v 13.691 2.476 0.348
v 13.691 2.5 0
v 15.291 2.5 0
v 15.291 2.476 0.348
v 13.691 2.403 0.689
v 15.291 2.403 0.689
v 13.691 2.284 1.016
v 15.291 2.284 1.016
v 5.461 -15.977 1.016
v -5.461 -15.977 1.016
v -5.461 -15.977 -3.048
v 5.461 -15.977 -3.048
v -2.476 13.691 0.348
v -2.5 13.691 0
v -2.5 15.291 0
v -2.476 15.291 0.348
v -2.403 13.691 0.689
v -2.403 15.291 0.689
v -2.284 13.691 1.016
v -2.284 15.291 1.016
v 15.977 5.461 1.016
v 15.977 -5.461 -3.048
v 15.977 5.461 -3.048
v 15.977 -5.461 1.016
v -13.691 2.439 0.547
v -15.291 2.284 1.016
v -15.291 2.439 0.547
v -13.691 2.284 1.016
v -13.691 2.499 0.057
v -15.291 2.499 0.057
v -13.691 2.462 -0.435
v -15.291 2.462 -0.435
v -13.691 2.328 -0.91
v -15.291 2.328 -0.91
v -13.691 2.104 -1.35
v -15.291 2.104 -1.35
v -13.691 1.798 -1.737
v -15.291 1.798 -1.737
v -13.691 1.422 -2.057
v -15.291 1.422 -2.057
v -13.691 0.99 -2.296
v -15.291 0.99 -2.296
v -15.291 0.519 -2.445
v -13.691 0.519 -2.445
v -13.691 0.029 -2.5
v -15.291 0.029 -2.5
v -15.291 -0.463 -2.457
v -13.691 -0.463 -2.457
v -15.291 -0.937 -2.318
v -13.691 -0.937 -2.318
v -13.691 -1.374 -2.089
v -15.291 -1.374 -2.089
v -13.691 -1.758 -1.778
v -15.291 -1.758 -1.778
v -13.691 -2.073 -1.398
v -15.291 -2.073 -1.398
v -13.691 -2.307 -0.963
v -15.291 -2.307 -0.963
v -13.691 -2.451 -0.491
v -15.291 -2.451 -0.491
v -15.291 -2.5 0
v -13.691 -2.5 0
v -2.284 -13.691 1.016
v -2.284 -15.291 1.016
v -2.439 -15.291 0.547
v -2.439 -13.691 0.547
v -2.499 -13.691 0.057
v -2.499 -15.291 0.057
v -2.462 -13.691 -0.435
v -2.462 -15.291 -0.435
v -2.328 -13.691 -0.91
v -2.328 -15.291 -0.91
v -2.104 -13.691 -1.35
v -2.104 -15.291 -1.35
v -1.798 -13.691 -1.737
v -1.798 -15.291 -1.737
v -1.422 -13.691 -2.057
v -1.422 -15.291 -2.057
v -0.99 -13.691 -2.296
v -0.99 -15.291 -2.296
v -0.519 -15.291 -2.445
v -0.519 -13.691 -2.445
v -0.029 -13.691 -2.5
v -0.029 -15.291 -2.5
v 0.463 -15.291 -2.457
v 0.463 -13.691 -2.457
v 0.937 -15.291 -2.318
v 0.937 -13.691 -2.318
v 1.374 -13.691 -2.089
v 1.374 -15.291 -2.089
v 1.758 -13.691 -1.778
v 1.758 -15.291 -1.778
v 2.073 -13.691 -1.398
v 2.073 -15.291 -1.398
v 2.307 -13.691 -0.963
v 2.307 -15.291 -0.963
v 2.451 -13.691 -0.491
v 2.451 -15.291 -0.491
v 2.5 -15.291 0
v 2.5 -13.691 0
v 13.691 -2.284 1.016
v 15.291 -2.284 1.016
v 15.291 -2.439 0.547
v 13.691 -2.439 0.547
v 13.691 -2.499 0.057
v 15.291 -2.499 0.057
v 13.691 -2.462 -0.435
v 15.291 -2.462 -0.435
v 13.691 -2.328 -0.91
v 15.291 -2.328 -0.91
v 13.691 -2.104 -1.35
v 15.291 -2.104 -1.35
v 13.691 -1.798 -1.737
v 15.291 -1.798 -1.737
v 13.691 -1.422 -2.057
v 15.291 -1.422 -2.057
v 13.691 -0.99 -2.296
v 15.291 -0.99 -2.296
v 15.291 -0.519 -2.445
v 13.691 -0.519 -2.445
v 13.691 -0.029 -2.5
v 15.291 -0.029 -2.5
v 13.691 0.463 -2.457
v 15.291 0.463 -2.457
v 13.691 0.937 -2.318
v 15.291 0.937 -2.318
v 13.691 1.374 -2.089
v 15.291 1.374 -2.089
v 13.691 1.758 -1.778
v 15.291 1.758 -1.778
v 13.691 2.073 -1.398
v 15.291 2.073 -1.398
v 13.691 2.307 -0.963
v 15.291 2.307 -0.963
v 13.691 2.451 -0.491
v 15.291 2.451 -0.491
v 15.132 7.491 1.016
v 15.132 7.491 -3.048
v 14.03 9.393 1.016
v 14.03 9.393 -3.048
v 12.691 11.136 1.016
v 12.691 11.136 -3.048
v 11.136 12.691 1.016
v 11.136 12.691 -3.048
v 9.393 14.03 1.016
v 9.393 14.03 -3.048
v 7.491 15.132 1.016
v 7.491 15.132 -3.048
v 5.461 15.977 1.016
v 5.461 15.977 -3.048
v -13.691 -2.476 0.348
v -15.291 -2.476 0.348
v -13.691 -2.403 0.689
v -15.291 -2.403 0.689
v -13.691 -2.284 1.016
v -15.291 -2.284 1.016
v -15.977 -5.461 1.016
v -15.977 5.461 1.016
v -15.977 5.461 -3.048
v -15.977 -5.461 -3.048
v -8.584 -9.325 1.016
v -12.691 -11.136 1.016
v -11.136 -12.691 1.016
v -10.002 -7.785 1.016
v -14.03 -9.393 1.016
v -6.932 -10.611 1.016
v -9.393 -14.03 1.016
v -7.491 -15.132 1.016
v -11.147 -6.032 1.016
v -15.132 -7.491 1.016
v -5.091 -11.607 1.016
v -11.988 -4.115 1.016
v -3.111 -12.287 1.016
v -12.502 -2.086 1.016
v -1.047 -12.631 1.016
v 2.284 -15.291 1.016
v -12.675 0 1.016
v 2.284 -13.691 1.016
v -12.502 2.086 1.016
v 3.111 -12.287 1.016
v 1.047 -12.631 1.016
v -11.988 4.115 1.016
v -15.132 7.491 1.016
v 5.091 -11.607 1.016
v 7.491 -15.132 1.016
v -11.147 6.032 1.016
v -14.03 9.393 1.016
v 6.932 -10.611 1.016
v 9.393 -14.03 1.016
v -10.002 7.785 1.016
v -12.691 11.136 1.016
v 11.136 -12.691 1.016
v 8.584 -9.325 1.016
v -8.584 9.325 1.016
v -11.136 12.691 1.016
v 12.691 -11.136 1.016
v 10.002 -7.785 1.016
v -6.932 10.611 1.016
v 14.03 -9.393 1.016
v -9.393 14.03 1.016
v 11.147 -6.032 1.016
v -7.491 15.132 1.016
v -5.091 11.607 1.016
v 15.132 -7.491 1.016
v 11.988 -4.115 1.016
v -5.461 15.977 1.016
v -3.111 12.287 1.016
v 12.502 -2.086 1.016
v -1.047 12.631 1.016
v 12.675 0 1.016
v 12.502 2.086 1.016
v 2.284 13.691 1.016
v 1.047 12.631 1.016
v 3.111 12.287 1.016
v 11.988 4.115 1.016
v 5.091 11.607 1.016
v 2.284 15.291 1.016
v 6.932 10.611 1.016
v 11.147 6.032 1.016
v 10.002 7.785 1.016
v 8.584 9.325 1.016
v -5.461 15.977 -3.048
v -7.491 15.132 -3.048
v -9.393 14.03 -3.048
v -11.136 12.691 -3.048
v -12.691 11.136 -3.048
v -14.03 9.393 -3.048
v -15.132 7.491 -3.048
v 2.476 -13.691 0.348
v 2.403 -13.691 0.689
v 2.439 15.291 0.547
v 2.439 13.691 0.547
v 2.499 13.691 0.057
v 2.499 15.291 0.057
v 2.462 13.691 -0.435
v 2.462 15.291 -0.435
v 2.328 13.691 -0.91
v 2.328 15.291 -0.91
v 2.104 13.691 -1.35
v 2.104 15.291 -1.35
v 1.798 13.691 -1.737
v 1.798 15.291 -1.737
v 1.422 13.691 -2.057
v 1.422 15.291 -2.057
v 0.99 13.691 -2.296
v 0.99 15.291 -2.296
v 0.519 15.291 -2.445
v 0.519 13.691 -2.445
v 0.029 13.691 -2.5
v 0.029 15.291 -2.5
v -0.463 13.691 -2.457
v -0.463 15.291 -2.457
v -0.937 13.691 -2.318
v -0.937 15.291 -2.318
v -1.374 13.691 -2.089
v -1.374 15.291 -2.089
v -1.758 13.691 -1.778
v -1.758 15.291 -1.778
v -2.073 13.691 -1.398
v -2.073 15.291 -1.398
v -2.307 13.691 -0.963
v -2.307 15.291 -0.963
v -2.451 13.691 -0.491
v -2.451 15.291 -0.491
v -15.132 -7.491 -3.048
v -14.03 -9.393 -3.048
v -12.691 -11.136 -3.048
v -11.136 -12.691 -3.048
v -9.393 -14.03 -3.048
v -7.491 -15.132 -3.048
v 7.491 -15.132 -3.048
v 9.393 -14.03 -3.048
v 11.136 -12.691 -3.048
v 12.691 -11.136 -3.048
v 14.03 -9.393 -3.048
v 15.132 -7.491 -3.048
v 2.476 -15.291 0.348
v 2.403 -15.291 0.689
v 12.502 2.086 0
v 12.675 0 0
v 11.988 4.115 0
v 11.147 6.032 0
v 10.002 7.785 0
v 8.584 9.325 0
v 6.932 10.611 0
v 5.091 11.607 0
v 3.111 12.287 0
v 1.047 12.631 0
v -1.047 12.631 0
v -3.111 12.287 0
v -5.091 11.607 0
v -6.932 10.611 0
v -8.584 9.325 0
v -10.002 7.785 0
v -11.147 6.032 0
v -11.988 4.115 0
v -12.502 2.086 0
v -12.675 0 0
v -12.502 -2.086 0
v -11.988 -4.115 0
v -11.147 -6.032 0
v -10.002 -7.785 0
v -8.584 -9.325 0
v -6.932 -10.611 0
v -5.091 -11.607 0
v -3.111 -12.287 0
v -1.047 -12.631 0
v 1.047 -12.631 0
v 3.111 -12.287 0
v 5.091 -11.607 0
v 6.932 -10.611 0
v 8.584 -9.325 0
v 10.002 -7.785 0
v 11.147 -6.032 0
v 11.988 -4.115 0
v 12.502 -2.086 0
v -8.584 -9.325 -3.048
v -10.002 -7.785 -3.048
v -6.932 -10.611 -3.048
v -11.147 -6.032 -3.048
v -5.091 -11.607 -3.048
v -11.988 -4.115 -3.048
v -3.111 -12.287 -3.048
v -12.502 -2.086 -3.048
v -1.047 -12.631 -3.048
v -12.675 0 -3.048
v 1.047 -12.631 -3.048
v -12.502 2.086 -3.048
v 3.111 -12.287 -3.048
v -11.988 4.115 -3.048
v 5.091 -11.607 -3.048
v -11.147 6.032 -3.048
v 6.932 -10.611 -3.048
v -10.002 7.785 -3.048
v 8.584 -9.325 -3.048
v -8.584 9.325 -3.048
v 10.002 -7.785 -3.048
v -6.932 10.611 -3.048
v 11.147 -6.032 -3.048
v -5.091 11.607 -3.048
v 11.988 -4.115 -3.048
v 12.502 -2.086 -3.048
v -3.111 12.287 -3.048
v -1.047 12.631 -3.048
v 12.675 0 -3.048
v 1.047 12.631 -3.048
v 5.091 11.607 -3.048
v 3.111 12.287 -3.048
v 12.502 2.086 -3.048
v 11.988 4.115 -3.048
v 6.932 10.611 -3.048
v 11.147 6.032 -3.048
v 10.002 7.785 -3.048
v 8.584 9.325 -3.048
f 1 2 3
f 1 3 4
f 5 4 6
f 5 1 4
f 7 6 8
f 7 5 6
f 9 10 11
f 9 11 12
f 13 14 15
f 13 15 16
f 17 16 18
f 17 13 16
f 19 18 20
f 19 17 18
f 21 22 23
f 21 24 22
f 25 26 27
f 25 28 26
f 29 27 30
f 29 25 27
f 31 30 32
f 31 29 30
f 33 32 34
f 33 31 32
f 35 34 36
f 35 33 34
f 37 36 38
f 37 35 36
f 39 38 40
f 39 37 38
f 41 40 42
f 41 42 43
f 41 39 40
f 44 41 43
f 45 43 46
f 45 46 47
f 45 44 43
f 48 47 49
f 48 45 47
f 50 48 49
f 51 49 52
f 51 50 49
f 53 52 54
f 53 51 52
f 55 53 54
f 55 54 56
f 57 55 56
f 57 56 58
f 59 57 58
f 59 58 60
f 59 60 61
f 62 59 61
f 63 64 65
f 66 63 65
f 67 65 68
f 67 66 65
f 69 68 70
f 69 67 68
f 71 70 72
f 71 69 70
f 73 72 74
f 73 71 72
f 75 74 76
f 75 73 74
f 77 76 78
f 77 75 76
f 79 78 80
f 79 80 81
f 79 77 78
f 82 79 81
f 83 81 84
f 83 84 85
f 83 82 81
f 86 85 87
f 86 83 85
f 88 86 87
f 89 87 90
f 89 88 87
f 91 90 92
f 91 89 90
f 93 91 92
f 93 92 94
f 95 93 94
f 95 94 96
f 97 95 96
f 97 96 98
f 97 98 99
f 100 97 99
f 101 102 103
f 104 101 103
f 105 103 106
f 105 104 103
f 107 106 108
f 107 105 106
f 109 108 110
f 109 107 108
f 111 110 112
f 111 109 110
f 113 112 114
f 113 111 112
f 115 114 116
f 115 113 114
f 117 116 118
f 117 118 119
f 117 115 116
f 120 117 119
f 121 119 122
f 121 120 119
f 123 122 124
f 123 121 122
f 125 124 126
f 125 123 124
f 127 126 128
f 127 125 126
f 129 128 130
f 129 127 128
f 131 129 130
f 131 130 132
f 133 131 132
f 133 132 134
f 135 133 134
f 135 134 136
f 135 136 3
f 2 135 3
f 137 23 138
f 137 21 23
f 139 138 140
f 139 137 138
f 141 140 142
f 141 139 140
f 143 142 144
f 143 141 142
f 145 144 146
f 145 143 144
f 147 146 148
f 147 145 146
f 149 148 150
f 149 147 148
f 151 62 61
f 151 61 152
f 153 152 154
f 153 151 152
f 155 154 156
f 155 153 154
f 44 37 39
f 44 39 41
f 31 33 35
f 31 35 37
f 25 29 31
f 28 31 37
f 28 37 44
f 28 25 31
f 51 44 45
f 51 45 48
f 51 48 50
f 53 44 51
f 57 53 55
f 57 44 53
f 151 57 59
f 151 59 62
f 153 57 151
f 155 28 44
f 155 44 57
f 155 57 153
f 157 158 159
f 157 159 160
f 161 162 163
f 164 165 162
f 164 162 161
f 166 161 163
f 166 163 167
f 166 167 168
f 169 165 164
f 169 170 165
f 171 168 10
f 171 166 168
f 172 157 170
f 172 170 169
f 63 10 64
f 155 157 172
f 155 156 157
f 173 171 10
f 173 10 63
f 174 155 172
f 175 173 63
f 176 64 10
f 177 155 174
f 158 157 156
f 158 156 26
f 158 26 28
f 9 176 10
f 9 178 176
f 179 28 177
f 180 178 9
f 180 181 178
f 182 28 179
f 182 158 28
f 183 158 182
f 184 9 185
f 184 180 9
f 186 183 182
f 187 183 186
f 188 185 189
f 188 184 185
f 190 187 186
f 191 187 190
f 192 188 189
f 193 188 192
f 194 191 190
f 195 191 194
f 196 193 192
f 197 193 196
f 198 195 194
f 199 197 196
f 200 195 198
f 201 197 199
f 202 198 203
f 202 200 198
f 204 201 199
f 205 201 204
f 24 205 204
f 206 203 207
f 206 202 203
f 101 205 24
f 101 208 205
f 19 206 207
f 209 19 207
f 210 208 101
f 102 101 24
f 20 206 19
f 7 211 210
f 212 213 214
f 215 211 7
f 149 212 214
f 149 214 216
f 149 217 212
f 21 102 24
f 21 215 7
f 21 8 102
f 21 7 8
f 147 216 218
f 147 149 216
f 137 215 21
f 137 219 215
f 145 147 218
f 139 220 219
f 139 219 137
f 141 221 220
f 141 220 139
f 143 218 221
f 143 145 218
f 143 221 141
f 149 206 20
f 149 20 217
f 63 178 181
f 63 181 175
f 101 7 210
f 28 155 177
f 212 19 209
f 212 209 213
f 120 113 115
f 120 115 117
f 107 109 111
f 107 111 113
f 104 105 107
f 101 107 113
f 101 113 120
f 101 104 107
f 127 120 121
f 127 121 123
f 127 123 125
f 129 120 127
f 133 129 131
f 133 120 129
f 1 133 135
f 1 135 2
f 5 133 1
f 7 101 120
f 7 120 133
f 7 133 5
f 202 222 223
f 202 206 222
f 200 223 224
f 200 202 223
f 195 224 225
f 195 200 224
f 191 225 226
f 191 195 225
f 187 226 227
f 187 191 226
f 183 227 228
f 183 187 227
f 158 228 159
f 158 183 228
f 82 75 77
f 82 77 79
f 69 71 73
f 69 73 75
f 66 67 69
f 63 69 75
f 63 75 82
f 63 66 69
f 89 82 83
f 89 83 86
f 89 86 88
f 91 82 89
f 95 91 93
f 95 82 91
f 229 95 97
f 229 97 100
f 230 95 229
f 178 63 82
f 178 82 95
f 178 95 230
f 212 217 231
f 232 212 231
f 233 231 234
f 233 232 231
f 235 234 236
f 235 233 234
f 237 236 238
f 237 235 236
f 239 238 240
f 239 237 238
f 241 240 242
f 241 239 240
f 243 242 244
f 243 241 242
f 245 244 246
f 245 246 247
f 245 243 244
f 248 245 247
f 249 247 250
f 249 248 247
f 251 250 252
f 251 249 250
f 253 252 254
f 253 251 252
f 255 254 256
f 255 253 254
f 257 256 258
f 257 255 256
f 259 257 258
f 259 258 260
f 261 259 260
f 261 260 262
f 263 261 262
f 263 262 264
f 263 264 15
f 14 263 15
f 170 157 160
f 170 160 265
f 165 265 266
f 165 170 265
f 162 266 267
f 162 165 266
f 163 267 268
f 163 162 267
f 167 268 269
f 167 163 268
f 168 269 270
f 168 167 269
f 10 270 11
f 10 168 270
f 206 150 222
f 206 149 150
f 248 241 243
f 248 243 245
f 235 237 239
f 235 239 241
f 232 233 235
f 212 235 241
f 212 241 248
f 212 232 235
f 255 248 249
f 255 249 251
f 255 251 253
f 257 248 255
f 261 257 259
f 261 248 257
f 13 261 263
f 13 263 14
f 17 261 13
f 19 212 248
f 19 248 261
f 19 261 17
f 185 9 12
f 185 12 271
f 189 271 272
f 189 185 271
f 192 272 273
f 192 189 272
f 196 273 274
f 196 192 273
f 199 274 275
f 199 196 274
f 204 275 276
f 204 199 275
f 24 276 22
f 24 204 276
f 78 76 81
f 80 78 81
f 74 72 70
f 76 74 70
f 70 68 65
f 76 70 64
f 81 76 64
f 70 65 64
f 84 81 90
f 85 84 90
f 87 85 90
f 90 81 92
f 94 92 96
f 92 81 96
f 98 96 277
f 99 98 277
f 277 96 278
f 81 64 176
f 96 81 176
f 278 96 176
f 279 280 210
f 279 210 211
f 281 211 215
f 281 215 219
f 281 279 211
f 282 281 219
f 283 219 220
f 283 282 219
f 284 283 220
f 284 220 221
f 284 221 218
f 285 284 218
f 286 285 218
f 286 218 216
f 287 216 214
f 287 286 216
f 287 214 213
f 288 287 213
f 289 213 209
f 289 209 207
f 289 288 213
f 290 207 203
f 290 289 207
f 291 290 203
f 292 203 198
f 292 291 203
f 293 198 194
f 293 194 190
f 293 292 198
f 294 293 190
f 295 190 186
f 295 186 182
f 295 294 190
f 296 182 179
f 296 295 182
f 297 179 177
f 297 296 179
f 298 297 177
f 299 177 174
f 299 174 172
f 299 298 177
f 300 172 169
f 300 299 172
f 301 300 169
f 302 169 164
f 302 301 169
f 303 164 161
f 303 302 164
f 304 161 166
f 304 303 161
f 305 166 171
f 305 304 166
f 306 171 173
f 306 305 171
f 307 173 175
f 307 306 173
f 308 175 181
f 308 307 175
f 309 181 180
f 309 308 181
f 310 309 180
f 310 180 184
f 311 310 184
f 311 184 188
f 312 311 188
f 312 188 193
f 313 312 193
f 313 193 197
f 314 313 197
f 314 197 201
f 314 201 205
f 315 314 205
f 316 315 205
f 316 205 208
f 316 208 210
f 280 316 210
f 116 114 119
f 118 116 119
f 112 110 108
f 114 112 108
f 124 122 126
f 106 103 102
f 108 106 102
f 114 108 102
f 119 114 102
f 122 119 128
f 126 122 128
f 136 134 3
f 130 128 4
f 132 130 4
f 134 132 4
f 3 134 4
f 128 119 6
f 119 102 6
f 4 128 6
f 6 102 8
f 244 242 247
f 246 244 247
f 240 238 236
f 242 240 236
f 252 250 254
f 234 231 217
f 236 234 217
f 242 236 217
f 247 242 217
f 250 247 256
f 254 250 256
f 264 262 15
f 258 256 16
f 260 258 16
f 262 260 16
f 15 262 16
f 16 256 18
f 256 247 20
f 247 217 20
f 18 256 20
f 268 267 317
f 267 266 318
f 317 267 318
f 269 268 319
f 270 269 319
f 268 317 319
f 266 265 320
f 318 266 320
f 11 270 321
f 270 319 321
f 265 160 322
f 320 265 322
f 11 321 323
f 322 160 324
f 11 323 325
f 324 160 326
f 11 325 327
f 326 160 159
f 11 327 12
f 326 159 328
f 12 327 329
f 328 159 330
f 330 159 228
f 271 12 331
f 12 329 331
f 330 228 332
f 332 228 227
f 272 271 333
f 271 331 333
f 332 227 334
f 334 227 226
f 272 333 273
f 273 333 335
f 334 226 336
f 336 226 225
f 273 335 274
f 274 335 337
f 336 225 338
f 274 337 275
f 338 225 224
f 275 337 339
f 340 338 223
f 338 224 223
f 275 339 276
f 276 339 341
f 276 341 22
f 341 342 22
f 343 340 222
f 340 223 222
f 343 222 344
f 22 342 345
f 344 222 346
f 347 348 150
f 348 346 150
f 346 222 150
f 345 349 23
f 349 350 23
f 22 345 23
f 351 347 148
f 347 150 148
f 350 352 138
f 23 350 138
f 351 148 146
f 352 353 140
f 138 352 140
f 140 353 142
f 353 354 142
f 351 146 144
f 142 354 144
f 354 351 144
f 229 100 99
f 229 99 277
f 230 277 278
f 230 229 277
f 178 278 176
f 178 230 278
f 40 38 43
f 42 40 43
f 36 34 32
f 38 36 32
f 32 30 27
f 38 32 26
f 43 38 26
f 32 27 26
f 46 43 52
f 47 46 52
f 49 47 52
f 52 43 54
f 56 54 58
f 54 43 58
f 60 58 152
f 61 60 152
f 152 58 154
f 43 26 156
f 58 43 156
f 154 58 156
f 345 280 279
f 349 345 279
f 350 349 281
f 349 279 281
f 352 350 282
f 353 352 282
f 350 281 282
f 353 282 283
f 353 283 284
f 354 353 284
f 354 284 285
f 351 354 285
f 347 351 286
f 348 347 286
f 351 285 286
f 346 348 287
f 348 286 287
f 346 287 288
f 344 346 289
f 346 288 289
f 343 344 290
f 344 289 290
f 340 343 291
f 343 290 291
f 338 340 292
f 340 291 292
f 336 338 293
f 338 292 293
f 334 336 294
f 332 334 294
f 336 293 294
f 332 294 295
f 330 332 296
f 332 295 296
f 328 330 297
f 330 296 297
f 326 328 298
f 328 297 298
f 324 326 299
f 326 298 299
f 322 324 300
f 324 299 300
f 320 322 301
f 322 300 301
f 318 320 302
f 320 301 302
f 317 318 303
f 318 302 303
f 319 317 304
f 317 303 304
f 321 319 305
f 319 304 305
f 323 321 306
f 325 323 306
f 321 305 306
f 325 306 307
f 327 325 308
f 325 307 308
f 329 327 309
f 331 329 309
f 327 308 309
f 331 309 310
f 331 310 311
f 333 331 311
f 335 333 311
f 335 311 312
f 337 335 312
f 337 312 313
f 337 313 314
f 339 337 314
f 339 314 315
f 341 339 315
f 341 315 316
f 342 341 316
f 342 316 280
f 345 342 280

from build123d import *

# Parameters (mm, degrees)
SKETCH1_R                = 12.6746
BOSS_EXTRUDE1_DEPTH      = 1.016
BOSS_EXTRUDE1_DEPTH_BACK = 3.048
SKETCH3_W                = 1.6002
SKETCH3_H                = 2.499999953
CIRPATTERN1_COUNT        = 4


with BuildPart() as part:
    # Sketch1 → Boss-Extrude1 (new body, two sides)
    with BuildSketch(Plane.XY) as boss_extrude1_sk:
        with BuildLine():
            ThreePointArc((-5.461088217, 15.9766), (-11.938911845, 11.938911845), (-15.9766, 5.461088217))
            Line((-15.9766, 5.461088217), (-15.9766, -5.461088217))
            ThreePointArc((-15.9766, -5.461088217), (-11.938911845, -11.938911845), (-5.461088217, -15.9766))
            Line((-5.461088217, -15.9766), (5.461088217, -15.9766))
            ThreePointArc((5.461088217, -15.9766), (11.938911845, -11.938911845), (15.9766, -5.461088217))
            Line((15.9766, -5.461088217), (15.9766, 5.461088217))
            ThreePointArc((15.9766, 5.461088217), (11.938911845, 11.938911845), (5.461088217, 15.9766))
            Line((5.461088217, 15.9766), (-5.461088217, 15.9766))
        make_face()
        Circle(SKETCH1_R, mode=Mode.SUBTRACT)
    extrude(amount=BOSS_EXTRUDE1_DEPTH)
    extrude(boss_extrude1_sk.sketch, amount=-BOSS_EXTRUDE1_DEPTH_BACK)

    # Sketch3 → Cut-Revolve2 (revolve, cut)
    with BuildSketch(Plane.XY):
        with Locations((-14.4907, -1.249999977)):
            Rectangle(SKETCH3_W, SKETCH3_H)
    cut_revolve2 = revolve(axis=Axis((-13.6906, 0, 0), (-1, 0, 0)), mode=Mode.SUBTRACT)

    # CirPattern1: Cut-Revolve2 ×4 about axis
    cirpattern1_axis = Axis((0, 0, 0), (0, 0, 1))
    for i in range(1, CIRPATTERN1_COUNT):
        add(cut_revolve2.rotate(cirpattern1_axis, i * 360 / CIRPATTERN1_COUNT), mode=Mode.SUBTRACT)


solid = part.part
